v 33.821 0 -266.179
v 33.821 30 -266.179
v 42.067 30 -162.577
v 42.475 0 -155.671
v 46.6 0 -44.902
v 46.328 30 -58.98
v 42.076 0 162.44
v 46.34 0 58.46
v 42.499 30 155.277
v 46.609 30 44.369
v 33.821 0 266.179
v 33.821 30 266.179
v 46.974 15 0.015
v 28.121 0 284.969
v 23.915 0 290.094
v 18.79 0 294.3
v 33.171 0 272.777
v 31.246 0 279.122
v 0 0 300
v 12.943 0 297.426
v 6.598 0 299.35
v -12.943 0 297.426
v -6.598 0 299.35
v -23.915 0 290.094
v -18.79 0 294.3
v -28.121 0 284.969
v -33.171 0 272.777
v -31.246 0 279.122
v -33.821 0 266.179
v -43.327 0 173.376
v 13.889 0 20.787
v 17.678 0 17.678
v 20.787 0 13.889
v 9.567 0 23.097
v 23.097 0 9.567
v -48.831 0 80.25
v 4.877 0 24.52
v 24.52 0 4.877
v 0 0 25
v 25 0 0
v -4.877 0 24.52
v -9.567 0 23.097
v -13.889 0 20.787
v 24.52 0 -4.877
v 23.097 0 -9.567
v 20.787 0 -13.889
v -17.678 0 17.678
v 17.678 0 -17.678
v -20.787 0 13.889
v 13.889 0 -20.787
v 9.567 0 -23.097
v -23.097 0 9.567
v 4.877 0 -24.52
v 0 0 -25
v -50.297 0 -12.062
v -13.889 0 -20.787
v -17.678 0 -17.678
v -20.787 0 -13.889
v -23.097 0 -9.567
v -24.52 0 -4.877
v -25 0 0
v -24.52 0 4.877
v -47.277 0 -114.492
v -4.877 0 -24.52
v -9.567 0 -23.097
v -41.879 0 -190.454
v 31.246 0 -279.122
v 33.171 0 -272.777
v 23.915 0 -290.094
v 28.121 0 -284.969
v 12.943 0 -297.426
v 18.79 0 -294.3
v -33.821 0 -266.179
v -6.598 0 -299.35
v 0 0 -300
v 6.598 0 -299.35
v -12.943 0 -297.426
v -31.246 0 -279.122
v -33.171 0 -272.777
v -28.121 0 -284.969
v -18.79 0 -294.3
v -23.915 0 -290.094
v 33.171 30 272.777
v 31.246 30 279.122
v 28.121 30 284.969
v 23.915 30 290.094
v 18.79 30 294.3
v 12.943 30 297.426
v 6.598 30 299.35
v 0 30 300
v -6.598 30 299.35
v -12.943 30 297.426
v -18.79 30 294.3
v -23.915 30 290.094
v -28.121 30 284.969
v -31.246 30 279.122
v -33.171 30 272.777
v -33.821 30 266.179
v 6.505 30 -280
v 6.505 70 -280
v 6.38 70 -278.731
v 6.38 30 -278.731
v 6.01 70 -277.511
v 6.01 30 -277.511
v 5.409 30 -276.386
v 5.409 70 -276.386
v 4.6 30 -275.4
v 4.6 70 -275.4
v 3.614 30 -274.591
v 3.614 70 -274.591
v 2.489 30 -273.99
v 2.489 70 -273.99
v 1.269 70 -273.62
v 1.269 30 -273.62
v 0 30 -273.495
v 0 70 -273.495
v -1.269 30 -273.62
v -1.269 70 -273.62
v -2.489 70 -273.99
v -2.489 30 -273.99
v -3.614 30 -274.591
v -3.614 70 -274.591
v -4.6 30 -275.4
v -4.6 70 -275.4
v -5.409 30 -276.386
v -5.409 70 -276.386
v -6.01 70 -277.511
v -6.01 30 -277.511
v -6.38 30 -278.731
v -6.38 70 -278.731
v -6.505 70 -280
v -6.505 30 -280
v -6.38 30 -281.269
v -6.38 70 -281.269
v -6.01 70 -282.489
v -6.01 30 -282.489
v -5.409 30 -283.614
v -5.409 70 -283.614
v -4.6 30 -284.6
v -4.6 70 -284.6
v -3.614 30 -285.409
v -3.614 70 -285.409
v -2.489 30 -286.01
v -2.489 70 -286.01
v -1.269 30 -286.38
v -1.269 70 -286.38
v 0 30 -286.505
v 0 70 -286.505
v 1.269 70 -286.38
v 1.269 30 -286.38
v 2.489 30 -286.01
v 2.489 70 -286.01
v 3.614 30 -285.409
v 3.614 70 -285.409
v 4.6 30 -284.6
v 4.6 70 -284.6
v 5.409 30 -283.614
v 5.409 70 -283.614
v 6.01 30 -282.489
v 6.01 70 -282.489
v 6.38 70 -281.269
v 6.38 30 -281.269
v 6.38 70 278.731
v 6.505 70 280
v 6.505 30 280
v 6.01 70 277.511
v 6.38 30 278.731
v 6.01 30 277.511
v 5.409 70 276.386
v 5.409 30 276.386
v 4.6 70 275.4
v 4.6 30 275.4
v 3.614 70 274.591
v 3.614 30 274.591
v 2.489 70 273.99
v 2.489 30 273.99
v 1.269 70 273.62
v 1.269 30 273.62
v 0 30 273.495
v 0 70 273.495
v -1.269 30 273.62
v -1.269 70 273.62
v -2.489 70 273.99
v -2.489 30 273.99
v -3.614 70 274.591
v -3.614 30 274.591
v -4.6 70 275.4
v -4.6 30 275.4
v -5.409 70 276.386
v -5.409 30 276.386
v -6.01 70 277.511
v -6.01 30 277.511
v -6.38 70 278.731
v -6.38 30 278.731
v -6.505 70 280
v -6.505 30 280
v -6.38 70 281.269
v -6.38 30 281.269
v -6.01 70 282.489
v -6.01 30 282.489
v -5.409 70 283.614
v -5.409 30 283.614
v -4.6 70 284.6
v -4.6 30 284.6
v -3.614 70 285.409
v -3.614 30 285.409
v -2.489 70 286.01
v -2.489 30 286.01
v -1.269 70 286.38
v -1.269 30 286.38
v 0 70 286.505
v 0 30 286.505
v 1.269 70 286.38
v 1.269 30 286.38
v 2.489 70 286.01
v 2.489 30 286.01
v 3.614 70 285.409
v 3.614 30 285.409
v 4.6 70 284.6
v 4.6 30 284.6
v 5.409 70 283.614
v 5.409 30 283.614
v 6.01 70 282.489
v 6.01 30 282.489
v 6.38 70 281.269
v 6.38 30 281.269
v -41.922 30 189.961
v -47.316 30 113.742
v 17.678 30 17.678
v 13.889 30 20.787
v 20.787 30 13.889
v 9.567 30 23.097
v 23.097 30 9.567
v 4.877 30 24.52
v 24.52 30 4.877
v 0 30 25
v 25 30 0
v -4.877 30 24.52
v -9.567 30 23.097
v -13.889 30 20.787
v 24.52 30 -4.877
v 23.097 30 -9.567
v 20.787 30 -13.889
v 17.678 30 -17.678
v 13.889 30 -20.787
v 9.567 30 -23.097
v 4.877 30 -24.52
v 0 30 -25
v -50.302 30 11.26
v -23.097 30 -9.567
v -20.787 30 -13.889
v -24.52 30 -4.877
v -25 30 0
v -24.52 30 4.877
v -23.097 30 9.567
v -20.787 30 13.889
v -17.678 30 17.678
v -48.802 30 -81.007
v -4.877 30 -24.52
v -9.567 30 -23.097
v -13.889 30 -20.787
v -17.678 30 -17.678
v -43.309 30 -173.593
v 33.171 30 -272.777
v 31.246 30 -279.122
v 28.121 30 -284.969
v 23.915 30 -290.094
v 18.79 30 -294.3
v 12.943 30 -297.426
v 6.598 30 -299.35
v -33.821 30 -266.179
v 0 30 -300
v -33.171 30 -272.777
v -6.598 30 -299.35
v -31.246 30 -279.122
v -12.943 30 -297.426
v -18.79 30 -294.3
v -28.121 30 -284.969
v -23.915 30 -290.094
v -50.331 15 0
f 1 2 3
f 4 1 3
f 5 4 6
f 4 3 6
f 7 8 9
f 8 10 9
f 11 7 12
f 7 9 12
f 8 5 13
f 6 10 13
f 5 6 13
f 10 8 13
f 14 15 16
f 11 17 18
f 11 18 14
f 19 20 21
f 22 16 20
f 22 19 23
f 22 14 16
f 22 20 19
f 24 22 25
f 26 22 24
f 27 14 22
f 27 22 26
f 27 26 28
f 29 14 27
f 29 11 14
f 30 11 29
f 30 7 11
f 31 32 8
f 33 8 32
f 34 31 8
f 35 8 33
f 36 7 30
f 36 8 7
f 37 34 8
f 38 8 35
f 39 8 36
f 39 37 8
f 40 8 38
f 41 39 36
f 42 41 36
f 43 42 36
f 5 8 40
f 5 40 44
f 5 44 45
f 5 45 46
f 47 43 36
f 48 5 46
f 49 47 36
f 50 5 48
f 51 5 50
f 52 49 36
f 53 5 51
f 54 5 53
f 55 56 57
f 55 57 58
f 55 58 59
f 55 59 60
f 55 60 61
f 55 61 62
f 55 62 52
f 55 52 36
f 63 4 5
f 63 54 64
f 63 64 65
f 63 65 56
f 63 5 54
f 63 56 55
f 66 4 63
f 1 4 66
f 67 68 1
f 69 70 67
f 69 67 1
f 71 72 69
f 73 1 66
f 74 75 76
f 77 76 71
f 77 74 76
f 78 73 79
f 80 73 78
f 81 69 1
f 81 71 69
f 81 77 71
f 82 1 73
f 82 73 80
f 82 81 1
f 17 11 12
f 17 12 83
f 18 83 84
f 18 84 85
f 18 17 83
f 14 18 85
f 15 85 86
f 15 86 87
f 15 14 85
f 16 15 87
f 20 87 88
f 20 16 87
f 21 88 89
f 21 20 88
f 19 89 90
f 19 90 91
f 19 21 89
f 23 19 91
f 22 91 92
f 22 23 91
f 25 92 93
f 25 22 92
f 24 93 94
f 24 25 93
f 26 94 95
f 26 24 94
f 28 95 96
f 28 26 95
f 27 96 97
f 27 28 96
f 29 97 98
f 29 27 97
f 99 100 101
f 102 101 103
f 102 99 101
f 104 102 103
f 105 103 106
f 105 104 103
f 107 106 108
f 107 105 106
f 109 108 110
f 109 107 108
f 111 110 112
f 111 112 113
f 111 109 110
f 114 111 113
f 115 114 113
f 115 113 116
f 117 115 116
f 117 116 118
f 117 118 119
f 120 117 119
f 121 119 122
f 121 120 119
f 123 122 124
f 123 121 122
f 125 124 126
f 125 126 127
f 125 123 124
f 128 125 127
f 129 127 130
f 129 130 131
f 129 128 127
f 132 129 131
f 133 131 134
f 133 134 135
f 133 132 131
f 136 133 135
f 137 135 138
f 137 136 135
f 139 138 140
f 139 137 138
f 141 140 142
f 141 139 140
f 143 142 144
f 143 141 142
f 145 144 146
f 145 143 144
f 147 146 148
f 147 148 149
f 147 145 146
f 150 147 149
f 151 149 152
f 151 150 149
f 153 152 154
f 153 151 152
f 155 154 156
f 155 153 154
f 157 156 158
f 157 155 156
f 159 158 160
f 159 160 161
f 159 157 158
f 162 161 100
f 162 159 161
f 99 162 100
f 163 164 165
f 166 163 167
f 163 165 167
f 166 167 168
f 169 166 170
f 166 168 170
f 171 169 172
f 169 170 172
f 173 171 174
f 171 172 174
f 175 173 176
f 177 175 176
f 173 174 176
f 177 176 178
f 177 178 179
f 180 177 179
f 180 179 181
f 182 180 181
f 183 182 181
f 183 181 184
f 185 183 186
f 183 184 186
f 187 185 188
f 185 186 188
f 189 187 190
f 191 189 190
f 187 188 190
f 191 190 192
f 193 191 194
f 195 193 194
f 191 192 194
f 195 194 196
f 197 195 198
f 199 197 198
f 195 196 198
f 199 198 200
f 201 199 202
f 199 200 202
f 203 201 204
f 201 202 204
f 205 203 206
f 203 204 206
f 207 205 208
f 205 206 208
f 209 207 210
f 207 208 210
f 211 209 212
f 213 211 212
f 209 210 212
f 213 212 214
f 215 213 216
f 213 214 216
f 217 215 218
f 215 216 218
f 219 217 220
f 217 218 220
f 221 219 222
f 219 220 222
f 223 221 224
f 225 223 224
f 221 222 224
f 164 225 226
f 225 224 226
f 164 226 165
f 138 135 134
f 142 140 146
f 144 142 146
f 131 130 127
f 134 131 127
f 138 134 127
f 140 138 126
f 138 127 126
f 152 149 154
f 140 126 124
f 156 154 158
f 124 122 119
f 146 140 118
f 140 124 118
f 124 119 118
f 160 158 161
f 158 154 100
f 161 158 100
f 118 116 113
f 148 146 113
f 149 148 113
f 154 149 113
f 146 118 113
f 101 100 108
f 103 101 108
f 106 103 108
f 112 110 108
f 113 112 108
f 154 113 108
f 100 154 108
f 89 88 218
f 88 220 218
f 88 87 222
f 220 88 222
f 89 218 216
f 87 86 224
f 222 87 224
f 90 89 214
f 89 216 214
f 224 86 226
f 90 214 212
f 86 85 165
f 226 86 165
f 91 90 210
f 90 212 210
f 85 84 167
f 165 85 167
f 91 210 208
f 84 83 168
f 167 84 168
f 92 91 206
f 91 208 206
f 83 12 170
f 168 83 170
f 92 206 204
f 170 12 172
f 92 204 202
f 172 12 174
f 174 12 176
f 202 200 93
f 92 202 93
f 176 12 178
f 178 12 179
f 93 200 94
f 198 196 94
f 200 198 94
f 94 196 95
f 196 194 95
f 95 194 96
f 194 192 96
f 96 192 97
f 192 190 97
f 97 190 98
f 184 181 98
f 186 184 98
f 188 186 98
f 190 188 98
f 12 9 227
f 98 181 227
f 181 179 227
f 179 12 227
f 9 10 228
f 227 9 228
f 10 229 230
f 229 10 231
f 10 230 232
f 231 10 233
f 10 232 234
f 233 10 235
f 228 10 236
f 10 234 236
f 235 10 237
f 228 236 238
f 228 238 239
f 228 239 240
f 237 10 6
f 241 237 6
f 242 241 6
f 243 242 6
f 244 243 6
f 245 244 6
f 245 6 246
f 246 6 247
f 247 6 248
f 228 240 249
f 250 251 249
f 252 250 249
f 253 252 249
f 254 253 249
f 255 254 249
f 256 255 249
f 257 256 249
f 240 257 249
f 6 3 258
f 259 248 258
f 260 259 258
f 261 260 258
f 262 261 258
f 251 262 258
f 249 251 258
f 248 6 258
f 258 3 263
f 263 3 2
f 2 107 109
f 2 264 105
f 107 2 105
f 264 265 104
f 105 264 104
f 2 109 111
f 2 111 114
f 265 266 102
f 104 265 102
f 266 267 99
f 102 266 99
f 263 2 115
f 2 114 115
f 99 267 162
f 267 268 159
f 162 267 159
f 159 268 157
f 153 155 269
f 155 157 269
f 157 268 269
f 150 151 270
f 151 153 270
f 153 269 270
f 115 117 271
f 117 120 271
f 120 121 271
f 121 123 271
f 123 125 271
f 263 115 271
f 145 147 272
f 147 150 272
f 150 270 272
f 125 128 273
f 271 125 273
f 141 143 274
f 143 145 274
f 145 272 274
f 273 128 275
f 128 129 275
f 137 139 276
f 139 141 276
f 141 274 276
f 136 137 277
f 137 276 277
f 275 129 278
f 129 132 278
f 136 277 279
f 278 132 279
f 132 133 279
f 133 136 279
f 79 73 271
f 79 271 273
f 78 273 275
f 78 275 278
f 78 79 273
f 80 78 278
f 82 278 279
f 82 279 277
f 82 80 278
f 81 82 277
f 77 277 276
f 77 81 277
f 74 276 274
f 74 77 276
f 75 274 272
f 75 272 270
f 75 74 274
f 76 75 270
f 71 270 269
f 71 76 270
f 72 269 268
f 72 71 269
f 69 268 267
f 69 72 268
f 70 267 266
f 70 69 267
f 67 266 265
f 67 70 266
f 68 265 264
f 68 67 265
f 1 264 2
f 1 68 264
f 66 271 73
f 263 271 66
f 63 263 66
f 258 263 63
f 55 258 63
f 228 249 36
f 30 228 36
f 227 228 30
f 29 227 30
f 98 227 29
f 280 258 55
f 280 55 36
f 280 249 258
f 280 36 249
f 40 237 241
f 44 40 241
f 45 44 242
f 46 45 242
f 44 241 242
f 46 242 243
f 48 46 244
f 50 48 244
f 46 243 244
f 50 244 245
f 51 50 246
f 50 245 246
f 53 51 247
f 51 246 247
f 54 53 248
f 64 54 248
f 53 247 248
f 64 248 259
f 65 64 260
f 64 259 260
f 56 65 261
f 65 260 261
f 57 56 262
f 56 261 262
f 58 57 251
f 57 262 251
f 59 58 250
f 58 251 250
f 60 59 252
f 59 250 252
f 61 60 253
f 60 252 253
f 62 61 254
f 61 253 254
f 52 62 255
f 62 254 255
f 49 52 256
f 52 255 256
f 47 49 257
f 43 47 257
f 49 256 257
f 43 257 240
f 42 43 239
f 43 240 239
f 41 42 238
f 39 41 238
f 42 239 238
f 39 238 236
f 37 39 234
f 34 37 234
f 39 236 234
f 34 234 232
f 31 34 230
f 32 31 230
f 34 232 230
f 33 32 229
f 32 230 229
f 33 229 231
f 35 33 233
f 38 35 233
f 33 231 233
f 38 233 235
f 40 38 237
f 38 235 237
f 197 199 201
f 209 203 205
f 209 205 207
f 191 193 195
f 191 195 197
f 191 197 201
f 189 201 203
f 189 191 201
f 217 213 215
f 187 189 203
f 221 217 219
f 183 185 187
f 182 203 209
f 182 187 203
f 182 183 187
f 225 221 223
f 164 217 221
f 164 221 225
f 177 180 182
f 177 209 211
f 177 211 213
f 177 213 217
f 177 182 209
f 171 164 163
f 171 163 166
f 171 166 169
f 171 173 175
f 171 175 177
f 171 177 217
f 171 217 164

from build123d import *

# Parameters (mm, degrees)
BOSS_EXTRUDE1_DEPTH = 30
SKETCH2_R           = 25
CUT_EXTRUDE1_DEPTH  = 30
SKETCH3_R           = 6.505
BOSS_EXTRUDE2_DEPTH = 40
CUT_EXTRUDE2_DEPTH  = 40


with BuildPart() as part:
    # Sketch1 → Boss-Extrude1 (new body)
    with BuildSketch(Plane(origin=(0, 0, 0), x_dir=(1, 0, 0), z_dir=(0, 1, 0))):
        with BuildLine():
            Line((-77.61802258, 0), (-33.820586084, 266.179413916))
            ThreePointArc((-33.820586084, 266.179413916), (0, 300), (33.820586084, 266.179413916))
            Line((33.820586084, 266.179413916), (72.176610565, 0))
            Line((72.176610565, 0), (33.820586084, -266.179413916))
            ThreePointArc((33.820586084, -266.179413916), (0, -300), (-33.820586084, -266.179413916))
            Line((-33.820586084, -266.179413916), (-77.61802258, 0))
        make_face()
    extrude(amount=BOSS_EXTRUDE1_DEPTH)

    # Sketch2 → Cut-Extrude1 (cut)
    with BuildSketch(Plane(origin=(0, 30, 0), x_dir=(1, 0, 0), z_dir=(0, 1, 0))):
        Circle(SKETCH2_R)
    extrude(amount=-CUT_EXTRUDE1_DEPTH, mode=Mode.SUBTRACT)

    # Sketch3 → Boss-Extrude2 (add)
    with BuildSketch(Plane(origin=(0, 30, 0), x_dir=(1, 0, 0), z_dir=(0, 1, 0))):
        with Locations((0, -280)):
            Circle(SKETCH3_R)
    boss_extrude2 = extrude(amount=BOSS_EXTRUDE2_DEPTH)

    # Mirror1: Boss-Extrude2 across plane
    add(boss_extrude2.mirror(Plane.XY))

    # Sketch4 → Cut-Extrude2 (cut)
    with BuildSketch(Plane(origin=(0, 30, 0), x_dir=(1, 0, 0), z_dir=(0, 1, 0))):
        with BuildLine():
            Line((-77.61802258, 0), (-33.820586084, -266.179413916))
            add(Edge.make_bspline(
                [(-33.820586084, 266.179413916), (-66.842002298, 0), (-33.820586084, -266.179413916)],
                knots=[0, 0, 0, 1, 1, 1], degree=2))
            add(Edge.make_bspline(
                [(-33.820586084, 266.179413916), (-77.61802258, 0)],
                knots=[0, 0, 1, 1], degree=1))
        make_face()
        with BuildLine():
            Line((72.176610565, 0), (33.820586084, 266.179413916))
            add(Edge.make_bspline(
                [(33.820586084, 266.179413916), (60.12786219, -0.030187119), (33.820586084, -266.179413916)],
                knots=[0, 0, 0, 1, 1, 1], degree=2))
            Line((33.820586084, -266.179413916), (72.176610565, 0))
        make_face()
    extrude(amount=-CUT_EXTRUDE2_DEPTH, mode=Mode.SUBTRACT)


solid = part.part
